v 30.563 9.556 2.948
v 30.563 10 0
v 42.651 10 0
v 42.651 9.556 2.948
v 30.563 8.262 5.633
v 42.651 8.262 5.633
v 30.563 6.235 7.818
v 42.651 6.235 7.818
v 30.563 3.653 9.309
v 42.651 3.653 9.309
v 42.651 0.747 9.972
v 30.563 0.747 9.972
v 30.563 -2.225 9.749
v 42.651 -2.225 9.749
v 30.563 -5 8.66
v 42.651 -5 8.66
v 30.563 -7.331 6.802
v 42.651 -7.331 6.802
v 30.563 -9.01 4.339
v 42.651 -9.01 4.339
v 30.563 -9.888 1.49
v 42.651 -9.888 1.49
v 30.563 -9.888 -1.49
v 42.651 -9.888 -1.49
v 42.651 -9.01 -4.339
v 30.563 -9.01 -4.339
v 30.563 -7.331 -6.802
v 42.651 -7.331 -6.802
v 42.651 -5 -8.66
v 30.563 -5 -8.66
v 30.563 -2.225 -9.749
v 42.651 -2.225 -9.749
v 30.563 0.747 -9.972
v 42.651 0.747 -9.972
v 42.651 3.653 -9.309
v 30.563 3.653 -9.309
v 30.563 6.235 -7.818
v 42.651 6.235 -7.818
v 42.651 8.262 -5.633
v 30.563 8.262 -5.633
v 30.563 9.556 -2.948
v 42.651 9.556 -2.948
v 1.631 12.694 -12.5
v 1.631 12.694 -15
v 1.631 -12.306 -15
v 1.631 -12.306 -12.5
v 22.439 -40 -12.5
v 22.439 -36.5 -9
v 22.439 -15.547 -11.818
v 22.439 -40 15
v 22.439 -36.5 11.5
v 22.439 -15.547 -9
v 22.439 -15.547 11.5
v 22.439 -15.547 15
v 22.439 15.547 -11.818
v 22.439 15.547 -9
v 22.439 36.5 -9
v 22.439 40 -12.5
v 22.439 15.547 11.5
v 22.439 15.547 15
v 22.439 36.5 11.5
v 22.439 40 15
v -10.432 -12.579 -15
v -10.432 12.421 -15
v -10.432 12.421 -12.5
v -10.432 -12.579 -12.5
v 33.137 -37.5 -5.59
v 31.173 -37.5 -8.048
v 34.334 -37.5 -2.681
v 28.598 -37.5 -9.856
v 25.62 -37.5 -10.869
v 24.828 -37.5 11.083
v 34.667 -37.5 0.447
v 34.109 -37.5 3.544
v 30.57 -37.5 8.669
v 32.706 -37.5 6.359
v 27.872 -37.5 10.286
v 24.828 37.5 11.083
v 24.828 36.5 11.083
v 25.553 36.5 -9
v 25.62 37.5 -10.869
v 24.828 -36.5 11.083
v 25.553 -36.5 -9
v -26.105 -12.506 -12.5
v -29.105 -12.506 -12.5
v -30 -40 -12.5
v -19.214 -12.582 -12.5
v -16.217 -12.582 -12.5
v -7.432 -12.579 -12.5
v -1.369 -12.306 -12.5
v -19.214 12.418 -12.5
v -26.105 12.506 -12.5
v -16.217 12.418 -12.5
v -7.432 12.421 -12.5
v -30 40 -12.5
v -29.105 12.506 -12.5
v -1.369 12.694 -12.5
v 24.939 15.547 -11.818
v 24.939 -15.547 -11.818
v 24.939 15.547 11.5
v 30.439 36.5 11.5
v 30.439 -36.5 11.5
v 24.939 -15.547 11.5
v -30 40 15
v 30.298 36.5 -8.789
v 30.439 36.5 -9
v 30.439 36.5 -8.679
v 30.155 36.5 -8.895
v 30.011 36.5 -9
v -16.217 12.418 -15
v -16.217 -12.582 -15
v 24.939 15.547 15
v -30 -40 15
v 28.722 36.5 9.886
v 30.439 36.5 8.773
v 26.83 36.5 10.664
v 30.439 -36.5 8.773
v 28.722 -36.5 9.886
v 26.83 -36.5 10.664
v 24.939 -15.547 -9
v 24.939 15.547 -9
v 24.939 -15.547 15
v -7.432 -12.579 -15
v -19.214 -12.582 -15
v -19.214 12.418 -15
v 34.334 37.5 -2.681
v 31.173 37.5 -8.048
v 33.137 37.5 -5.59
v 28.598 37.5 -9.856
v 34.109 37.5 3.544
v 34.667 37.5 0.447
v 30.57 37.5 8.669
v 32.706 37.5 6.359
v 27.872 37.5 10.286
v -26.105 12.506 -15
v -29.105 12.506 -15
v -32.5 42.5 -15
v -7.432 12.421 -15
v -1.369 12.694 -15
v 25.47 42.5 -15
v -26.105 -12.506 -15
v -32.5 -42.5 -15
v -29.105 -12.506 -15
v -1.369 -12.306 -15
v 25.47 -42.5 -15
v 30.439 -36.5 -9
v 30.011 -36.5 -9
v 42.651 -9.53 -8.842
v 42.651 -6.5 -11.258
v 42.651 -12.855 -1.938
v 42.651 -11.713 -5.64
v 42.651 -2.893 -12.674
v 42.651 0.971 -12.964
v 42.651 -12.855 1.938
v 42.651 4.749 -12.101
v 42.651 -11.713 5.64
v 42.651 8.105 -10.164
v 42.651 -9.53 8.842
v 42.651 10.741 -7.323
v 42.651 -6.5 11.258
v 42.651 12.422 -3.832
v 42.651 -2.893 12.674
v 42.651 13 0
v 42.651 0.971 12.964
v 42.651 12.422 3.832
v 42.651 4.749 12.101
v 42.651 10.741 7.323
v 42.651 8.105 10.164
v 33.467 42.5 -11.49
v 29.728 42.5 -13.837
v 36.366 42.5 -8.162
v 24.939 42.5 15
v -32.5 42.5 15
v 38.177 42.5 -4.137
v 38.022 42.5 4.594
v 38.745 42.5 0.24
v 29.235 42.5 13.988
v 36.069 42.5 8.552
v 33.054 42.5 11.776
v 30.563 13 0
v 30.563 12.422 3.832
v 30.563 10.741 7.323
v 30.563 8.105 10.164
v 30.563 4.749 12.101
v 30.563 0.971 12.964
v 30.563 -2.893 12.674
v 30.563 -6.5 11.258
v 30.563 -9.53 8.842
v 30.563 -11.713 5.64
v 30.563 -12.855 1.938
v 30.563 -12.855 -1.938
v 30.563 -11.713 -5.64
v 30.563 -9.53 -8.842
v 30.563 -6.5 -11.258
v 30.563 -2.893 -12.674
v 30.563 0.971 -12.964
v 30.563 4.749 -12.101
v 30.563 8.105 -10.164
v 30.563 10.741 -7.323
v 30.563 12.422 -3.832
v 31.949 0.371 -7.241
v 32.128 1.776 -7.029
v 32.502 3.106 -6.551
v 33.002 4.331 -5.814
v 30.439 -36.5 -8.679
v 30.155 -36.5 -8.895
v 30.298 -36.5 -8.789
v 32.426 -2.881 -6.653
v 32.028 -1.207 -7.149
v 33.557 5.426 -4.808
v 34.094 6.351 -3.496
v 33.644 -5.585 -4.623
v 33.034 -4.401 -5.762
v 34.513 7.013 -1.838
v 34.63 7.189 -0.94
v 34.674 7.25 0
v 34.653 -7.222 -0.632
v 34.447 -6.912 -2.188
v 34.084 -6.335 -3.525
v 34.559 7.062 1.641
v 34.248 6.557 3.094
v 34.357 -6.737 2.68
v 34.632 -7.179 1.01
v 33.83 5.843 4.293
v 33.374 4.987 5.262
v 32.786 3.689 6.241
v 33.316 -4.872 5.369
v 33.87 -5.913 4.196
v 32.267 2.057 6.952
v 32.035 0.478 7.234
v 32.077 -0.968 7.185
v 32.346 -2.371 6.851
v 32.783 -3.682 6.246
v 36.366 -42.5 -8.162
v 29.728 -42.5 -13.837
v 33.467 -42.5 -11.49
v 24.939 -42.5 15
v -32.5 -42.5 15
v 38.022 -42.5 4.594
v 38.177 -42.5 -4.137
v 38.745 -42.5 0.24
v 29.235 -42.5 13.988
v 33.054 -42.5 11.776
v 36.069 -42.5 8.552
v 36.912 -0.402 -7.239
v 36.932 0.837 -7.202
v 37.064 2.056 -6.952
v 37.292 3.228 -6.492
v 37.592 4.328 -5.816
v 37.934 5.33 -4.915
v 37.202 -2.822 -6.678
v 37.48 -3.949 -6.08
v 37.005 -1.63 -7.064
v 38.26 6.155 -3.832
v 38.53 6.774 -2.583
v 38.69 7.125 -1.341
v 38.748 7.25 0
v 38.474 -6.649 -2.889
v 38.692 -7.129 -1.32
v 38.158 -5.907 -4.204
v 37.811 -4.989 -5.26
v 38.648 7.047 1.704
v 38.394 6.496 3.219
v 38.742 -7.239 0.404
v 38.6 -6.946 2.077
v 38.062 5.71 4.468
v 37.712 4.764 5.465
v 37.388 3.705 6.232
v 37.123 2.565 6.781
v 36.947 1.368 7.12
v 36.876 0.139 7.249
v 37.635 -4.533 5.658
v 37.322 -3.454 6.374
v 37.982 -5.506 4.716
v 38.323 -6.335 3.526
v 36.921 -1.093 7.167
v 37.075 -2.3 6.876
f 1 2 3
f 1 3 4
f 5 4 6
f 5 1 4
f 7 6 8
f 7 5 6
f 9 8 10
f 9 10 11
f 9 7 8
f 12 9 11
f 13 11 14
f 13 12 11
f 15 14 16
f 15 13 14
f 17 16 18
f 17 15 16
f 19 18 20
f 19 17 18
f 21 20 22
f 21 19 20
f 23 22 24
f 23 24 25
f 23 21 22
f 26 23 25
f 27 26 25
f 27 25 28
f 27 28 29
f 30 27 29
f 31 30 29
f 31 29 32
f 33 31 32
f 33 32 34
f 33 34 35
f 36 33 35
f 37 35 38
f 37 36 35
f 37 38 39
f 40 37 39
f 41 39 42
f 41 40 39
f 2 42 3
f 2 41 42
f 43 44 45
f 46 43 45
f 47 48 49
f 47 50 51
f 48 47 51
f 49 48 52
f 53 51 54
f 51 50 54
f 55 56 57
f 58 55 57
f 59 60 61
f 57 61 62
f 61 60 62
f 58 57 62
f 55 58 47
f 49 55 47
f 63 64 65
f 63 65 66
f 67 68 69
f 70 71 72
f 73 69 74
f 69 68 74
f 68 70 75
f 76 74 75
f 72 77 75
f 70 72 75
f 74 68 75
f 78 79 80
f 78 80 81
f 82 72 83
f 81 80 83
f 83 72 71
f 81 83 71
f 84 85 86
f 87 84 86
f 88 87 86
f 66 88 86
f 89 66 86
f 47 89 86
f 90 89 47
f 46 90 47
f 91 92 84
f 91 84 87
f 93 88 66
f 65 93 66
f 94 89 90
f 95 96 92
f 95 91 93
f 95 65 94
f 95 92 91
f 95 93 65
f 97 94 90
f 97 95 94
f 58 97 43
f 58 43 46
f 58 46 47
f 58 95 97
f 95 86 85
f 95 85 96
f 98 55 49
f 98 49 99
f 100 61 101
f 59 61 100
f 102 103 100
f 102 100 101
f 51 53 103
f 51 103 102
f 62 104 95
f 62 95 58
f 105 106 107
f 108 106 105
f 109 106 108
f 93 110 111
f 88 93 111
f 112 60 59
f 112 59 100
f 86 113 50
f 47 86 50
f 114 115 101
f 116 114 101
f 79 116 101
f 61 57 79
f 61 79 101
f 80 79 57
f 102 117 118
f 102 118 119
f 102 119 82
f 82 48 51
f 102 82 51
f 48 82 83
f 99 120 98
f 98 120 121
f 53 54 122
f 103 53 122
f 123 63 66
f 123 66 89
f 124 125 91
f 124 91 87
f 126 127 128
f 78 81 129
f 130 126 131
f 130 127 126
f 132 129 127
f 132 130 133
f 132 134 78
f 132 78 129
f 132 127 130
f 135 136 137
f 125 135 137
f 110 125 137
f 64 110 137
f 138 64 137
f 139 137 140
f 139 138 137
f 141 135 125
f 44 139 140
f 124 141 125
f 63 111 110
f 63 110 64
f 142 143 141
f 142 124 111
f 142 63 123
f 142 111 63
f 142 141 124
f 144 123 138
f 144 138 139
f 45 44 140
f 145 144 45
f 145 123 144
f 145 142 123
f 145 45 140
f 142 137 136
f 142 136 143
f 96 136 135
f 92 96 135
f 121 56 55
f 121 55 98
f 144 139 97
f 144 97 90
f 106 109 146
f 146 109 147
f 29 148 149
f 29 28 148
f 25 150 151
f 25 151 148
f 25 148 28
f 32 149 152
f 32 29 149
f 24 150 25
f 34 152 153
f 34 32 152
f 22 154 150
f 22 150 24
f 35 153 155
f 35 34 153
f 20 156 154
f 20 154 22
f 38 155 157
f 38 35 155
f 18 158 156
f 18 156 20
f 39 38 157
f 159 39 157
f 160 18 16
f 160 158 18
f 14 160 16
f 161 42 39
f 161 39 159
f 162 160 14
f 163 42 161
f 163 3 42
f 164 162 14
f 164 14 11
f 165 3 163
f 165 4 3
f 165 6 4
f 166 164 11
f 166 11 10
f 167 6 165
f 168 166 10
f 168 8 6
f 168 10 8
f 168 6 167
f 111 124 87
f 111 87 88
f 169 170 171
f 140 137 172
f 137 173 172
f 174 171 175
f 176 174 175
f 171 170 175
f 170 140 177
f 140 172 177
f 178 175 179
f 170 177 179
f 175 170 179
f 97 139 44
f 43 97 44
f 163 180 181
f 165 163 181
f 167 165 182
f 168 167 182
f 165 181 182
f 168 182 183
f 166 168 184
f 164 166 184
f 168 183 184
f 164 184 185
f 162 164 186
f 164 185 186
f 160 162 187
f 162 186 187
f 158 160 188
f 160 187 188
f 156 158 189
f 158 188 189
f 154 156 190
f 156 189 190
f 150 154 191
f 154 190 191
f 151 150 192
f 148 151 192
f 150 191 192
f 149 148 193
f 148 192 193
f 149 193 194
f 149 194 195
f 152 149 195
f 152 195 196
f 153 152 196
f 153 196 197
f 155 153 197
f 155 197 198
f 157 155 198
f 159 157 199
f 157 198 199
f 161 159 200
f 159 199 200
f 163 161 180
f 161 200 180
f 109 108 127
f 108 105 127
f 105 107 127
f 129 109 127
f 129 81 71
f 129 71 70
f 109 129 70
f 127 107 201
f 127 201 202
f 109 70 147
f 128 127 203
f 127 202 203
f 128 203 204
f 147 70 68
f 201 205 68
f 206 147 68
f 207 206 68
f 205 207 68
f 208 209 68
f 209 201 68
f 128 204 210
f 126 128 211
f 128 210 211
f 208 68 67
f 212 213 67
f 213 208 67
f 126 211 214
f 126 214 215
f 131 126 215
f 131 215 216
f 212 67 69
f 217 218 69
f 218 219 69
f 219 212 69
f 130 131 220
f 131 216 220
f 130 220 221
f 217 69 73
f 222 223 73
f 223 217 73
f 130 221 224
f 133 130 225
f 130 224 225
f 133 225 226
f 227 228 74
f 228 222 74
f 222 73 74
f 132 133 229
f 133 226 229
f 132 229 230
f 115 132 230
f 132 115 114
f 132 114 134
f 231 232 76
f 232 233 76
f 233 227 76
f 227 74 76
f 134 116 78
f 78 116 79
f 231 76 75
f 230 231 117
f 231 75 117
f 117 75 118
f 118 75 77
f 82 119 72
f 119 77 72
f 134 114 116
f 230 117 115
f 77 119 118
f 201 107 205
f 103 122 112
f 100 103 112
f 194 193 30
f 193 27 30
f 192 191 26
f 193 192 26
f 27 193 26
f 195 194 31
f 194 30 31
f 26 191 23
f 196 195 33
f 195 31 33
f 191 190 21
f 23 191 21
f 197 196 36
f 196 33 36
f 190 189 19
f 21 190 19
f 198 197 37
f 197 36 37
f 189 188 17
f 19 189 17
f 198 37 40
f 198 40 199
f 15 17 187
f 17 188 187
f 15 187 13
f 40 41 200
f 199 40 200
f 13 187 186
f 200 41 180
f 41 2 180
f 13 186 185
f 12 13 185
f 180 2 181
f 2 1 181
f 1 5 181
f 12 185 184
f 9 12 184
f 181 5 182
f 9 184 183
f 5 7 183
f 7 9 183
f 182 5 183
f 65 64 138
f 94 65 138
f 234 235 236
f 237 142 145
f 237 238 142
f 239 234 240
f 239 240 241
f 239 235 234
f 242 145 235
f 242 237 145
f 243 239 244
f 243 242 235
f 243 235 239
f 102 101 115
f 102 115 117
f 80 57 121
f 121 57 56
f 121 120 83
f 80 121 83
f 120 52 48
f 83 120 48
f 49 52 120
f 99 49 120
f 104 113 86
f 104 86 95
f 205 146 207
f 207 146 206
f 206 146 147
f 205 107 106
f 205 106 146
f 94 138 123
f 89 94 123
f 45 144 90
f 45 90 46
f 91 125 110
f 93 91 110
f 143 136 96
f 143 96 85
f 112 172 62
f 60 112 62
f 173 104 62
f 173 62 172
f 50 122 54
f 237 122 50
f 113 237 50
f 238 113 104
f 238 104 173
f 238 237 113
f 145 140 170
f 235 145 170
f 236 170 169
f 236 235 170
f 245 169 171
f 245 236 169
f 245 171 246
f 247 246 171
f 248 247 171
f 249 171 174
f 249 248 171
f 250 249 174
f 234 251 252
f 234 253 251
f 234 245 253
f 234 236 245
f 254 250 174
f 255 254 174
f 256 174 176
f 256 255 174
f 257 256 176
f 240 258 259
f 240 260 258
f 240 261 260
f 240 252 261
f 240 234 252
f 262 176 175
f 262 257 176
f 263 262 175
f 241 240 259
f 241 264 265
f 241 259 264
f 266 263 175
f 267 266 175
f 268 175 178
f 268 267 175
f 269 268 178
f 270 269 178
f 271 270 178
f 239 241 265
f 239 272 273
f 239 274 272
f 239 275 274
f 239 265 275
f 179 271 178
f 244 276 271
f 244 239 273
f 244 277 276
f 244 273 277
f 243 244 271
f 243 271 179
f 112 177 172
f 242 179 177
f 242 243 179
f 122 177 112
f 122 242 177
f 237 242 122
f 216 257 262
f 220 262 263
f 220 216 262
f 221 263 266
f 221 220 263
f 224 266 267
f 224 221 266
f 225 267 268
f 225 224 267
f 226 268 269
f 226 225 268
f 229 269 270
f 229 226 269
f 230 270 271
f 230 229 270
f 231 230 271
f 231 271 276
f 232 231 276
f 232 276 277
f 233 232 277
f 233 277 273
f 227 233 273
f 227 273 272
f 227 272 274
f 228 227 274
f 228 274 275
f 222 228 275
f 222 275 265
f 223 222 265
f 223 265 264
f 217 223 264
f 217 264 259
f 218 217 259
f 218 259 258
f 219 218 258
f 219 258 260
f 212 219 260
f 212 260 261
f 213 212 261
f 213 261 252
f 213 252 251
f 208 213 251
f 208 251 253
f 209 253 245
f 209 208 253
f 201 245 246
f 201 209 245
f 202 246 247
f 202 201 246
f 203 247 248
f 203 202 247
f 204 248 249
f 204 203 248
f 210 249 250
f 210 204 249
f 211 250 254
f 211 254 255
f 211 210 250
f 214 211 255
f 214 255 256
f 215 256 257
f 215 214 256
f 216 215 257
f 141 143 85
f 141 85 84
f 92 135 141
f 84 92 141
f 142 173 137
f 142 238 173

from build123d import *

# Parameters (mm, degrees)
F1_DEPTH  = 42.5
F2_R      = 7.25
F3_DEPTH  = 38.7487115805
F4_W      = 3
F4_H      = 25.0110699423
F4_W_2    = 2.9971426107
F4_H_2    = 25
F5_DEPTH  = 30.0010001
F7_W      = 52.4388903172
F7_H      = 80
F7_W_2    = 2.9971426107
F7_H_2    = 25
F7_W_3    = 3
F7_H_3    = 25.0110699423
F8_DEPTH  = 27.5
F10_DEPTH = 37.5
F11_W     = 73
F11_H     = 20.5
F12_DEPTH = 8
F13_W     = 2.5983742954
F13_H     = 31.0936123133
F14_DEPTH = 26.81786
F16_START = 60.56282
F15_R     = 13
F15_R_2   = 10
F16_DEPTH = 12.08773


# Not quite as in the source:
# - a feature names something its author has since deleted; it is built from what else it names


with BuildPart() as f1:
    # F0 (on Front) → F1 (new body, symmetric)
    with BuildSketch(Plane.XZ):
        with BuildLine():
            Line((-32.5, -15), (25.4704337567, -15))
            ThreePointArc((25.4704337567, -15), (38.745344936, 0.2399153721), (24.9388903172, 15))
            Line((24.9388903172, 15), (22.3945248872, 15))
            Line((22.3945248872, 15), (-32.5, 15))
            Line((-32.5, 15), (-32.5, -15))
        make_face()
        with BuildLine():
            Line((25.399065212, -10.9720011933), (25.0102588618, 10.9720011933))
            ThreePointArc((25.0102588618, 10.9720011933), (34.7459726513, 0.1690540354), (25.399065212, -10.9720011933))
        make_face(mode=Mode.SUBTRACT)
        with BuildLine():
            ThreePointArc((25.399065212, -10.9720011933), (34.7459726513, 0.1690540354), (25.0102588618, 10.9720011933))
            Line((25.0102588618, 10.9720011933), (25.399065212, -10.9720011933))
        make_face()
    extrude(amount=F1_DEPTH, both=True)

    # F2 (on Right) → F3 (cut, through all)
    with BuildSketch(Plane.YZ):
        Circle(F2_R)
    extrude(amount=F3_DEPTH, mode=Mode.SUBTRACT)

    # F4 (on face) → F5 (cut, through all)
    with BuildSketch(Plane(origin=(0, 0, -15), x_dir=(1, 0, 0), z_dir=(0, 0, -1))):
        with Locations((-27.6051664799, 0)):
            Rectangle(F4_W, F4_H)
        with Locations((-17.7152827382, 0.0821705908)):
            Rectangle(F4_W_2, F4_H_2)
        with Locations((-8.9320717379, 0.0786611254)):
            Rectangle(F4_W, F4_H_2)
        with Locations((0.1306068152, -0.1937846464)):
            Rectangle(F4_W, F4_H_2)
    extrude(amount=-F5_DEPTH, mode=Mode.SUBTRACT)

    # F7 (on face) → F8 (cut)
    with BuildSketch(Plane.XY.offset(15)):
        with Locations((-3.7805548414, 0)):
            Rectangle(F7_W, F7_H)
        with Locations((-17.7152827382, -0.0821705908)):
            Rectangle(F7_W_2, F7_H_2, mode=Mode.SUBTRACT)
        with Locations((-8.9320717379, -0.0786611254)):
            Rectangle(F7_W_3, F7_H_2, mode=Mode.SUBTRACT)
        with Locations((-27.6051664799, 0)):
            Rectangle(F7_W_3, F7_H_3, mode=Mode.SUBTRACT)
        with Locations((0.1306068152, 0.1937846464)):
            Rectangle(F7_W_3, F7_H_2, mode=Mode.SUBTRACT)
    extrude(amount=-F8_DEPTH, mode=Mode.SUBTRACT)

    # F9 (on Front) → F10 (cut, symmetric)
    with BuildSketch(Plane.XZ):
        with BuildLine():
            Line((24.8281303793, 11.0828392208), (25.6202220917, -10.8693931252))
            ThreePointArc((25.6202220917, -10.8693931252), (34.6667124862, 0.4474334863), (24.8281303793, 11.0828392208))
        make_face()
    extrude(amount=F10_DEPTH, both=True, mode=Mode.SUBTRACT)

    # F11 (on face) → F12 (cut)
    with BuildSketch(Plane(origin=(22.4388903172, 0, 0), x_dir=(0, -1, 0), z_dir=(-1, 0, 0))):
        with Locations((0, 1.25)):
            Rectangle(F11_W, F11_H)
    extrude(amount=-F12_DEPTH, mode=Mode.SUBTRACT)

    # F13 (on face) → F14 (cut)
    with BuildSketch(Plane.XY.offset(15)):
        with Locations((23.6397031695, 0)):
            Rectangle(F13_W, F13_H)
    extrude(amount=-F14_DEPTH, mode=Mode.SUBTRACT)


with BuildPart() as f16:
    # F15 (on face) → F16 (new body)
    with BuildSketch(Plane.YZ.offset(-30).offset(F16_START)):
        Circle(F15_R)
        Circle(F15_R_2, mode=Mode.SUBTRACT)
    extrude(amount=F16_DEPTH)


solid = Compound([f1.part, f16.part])
